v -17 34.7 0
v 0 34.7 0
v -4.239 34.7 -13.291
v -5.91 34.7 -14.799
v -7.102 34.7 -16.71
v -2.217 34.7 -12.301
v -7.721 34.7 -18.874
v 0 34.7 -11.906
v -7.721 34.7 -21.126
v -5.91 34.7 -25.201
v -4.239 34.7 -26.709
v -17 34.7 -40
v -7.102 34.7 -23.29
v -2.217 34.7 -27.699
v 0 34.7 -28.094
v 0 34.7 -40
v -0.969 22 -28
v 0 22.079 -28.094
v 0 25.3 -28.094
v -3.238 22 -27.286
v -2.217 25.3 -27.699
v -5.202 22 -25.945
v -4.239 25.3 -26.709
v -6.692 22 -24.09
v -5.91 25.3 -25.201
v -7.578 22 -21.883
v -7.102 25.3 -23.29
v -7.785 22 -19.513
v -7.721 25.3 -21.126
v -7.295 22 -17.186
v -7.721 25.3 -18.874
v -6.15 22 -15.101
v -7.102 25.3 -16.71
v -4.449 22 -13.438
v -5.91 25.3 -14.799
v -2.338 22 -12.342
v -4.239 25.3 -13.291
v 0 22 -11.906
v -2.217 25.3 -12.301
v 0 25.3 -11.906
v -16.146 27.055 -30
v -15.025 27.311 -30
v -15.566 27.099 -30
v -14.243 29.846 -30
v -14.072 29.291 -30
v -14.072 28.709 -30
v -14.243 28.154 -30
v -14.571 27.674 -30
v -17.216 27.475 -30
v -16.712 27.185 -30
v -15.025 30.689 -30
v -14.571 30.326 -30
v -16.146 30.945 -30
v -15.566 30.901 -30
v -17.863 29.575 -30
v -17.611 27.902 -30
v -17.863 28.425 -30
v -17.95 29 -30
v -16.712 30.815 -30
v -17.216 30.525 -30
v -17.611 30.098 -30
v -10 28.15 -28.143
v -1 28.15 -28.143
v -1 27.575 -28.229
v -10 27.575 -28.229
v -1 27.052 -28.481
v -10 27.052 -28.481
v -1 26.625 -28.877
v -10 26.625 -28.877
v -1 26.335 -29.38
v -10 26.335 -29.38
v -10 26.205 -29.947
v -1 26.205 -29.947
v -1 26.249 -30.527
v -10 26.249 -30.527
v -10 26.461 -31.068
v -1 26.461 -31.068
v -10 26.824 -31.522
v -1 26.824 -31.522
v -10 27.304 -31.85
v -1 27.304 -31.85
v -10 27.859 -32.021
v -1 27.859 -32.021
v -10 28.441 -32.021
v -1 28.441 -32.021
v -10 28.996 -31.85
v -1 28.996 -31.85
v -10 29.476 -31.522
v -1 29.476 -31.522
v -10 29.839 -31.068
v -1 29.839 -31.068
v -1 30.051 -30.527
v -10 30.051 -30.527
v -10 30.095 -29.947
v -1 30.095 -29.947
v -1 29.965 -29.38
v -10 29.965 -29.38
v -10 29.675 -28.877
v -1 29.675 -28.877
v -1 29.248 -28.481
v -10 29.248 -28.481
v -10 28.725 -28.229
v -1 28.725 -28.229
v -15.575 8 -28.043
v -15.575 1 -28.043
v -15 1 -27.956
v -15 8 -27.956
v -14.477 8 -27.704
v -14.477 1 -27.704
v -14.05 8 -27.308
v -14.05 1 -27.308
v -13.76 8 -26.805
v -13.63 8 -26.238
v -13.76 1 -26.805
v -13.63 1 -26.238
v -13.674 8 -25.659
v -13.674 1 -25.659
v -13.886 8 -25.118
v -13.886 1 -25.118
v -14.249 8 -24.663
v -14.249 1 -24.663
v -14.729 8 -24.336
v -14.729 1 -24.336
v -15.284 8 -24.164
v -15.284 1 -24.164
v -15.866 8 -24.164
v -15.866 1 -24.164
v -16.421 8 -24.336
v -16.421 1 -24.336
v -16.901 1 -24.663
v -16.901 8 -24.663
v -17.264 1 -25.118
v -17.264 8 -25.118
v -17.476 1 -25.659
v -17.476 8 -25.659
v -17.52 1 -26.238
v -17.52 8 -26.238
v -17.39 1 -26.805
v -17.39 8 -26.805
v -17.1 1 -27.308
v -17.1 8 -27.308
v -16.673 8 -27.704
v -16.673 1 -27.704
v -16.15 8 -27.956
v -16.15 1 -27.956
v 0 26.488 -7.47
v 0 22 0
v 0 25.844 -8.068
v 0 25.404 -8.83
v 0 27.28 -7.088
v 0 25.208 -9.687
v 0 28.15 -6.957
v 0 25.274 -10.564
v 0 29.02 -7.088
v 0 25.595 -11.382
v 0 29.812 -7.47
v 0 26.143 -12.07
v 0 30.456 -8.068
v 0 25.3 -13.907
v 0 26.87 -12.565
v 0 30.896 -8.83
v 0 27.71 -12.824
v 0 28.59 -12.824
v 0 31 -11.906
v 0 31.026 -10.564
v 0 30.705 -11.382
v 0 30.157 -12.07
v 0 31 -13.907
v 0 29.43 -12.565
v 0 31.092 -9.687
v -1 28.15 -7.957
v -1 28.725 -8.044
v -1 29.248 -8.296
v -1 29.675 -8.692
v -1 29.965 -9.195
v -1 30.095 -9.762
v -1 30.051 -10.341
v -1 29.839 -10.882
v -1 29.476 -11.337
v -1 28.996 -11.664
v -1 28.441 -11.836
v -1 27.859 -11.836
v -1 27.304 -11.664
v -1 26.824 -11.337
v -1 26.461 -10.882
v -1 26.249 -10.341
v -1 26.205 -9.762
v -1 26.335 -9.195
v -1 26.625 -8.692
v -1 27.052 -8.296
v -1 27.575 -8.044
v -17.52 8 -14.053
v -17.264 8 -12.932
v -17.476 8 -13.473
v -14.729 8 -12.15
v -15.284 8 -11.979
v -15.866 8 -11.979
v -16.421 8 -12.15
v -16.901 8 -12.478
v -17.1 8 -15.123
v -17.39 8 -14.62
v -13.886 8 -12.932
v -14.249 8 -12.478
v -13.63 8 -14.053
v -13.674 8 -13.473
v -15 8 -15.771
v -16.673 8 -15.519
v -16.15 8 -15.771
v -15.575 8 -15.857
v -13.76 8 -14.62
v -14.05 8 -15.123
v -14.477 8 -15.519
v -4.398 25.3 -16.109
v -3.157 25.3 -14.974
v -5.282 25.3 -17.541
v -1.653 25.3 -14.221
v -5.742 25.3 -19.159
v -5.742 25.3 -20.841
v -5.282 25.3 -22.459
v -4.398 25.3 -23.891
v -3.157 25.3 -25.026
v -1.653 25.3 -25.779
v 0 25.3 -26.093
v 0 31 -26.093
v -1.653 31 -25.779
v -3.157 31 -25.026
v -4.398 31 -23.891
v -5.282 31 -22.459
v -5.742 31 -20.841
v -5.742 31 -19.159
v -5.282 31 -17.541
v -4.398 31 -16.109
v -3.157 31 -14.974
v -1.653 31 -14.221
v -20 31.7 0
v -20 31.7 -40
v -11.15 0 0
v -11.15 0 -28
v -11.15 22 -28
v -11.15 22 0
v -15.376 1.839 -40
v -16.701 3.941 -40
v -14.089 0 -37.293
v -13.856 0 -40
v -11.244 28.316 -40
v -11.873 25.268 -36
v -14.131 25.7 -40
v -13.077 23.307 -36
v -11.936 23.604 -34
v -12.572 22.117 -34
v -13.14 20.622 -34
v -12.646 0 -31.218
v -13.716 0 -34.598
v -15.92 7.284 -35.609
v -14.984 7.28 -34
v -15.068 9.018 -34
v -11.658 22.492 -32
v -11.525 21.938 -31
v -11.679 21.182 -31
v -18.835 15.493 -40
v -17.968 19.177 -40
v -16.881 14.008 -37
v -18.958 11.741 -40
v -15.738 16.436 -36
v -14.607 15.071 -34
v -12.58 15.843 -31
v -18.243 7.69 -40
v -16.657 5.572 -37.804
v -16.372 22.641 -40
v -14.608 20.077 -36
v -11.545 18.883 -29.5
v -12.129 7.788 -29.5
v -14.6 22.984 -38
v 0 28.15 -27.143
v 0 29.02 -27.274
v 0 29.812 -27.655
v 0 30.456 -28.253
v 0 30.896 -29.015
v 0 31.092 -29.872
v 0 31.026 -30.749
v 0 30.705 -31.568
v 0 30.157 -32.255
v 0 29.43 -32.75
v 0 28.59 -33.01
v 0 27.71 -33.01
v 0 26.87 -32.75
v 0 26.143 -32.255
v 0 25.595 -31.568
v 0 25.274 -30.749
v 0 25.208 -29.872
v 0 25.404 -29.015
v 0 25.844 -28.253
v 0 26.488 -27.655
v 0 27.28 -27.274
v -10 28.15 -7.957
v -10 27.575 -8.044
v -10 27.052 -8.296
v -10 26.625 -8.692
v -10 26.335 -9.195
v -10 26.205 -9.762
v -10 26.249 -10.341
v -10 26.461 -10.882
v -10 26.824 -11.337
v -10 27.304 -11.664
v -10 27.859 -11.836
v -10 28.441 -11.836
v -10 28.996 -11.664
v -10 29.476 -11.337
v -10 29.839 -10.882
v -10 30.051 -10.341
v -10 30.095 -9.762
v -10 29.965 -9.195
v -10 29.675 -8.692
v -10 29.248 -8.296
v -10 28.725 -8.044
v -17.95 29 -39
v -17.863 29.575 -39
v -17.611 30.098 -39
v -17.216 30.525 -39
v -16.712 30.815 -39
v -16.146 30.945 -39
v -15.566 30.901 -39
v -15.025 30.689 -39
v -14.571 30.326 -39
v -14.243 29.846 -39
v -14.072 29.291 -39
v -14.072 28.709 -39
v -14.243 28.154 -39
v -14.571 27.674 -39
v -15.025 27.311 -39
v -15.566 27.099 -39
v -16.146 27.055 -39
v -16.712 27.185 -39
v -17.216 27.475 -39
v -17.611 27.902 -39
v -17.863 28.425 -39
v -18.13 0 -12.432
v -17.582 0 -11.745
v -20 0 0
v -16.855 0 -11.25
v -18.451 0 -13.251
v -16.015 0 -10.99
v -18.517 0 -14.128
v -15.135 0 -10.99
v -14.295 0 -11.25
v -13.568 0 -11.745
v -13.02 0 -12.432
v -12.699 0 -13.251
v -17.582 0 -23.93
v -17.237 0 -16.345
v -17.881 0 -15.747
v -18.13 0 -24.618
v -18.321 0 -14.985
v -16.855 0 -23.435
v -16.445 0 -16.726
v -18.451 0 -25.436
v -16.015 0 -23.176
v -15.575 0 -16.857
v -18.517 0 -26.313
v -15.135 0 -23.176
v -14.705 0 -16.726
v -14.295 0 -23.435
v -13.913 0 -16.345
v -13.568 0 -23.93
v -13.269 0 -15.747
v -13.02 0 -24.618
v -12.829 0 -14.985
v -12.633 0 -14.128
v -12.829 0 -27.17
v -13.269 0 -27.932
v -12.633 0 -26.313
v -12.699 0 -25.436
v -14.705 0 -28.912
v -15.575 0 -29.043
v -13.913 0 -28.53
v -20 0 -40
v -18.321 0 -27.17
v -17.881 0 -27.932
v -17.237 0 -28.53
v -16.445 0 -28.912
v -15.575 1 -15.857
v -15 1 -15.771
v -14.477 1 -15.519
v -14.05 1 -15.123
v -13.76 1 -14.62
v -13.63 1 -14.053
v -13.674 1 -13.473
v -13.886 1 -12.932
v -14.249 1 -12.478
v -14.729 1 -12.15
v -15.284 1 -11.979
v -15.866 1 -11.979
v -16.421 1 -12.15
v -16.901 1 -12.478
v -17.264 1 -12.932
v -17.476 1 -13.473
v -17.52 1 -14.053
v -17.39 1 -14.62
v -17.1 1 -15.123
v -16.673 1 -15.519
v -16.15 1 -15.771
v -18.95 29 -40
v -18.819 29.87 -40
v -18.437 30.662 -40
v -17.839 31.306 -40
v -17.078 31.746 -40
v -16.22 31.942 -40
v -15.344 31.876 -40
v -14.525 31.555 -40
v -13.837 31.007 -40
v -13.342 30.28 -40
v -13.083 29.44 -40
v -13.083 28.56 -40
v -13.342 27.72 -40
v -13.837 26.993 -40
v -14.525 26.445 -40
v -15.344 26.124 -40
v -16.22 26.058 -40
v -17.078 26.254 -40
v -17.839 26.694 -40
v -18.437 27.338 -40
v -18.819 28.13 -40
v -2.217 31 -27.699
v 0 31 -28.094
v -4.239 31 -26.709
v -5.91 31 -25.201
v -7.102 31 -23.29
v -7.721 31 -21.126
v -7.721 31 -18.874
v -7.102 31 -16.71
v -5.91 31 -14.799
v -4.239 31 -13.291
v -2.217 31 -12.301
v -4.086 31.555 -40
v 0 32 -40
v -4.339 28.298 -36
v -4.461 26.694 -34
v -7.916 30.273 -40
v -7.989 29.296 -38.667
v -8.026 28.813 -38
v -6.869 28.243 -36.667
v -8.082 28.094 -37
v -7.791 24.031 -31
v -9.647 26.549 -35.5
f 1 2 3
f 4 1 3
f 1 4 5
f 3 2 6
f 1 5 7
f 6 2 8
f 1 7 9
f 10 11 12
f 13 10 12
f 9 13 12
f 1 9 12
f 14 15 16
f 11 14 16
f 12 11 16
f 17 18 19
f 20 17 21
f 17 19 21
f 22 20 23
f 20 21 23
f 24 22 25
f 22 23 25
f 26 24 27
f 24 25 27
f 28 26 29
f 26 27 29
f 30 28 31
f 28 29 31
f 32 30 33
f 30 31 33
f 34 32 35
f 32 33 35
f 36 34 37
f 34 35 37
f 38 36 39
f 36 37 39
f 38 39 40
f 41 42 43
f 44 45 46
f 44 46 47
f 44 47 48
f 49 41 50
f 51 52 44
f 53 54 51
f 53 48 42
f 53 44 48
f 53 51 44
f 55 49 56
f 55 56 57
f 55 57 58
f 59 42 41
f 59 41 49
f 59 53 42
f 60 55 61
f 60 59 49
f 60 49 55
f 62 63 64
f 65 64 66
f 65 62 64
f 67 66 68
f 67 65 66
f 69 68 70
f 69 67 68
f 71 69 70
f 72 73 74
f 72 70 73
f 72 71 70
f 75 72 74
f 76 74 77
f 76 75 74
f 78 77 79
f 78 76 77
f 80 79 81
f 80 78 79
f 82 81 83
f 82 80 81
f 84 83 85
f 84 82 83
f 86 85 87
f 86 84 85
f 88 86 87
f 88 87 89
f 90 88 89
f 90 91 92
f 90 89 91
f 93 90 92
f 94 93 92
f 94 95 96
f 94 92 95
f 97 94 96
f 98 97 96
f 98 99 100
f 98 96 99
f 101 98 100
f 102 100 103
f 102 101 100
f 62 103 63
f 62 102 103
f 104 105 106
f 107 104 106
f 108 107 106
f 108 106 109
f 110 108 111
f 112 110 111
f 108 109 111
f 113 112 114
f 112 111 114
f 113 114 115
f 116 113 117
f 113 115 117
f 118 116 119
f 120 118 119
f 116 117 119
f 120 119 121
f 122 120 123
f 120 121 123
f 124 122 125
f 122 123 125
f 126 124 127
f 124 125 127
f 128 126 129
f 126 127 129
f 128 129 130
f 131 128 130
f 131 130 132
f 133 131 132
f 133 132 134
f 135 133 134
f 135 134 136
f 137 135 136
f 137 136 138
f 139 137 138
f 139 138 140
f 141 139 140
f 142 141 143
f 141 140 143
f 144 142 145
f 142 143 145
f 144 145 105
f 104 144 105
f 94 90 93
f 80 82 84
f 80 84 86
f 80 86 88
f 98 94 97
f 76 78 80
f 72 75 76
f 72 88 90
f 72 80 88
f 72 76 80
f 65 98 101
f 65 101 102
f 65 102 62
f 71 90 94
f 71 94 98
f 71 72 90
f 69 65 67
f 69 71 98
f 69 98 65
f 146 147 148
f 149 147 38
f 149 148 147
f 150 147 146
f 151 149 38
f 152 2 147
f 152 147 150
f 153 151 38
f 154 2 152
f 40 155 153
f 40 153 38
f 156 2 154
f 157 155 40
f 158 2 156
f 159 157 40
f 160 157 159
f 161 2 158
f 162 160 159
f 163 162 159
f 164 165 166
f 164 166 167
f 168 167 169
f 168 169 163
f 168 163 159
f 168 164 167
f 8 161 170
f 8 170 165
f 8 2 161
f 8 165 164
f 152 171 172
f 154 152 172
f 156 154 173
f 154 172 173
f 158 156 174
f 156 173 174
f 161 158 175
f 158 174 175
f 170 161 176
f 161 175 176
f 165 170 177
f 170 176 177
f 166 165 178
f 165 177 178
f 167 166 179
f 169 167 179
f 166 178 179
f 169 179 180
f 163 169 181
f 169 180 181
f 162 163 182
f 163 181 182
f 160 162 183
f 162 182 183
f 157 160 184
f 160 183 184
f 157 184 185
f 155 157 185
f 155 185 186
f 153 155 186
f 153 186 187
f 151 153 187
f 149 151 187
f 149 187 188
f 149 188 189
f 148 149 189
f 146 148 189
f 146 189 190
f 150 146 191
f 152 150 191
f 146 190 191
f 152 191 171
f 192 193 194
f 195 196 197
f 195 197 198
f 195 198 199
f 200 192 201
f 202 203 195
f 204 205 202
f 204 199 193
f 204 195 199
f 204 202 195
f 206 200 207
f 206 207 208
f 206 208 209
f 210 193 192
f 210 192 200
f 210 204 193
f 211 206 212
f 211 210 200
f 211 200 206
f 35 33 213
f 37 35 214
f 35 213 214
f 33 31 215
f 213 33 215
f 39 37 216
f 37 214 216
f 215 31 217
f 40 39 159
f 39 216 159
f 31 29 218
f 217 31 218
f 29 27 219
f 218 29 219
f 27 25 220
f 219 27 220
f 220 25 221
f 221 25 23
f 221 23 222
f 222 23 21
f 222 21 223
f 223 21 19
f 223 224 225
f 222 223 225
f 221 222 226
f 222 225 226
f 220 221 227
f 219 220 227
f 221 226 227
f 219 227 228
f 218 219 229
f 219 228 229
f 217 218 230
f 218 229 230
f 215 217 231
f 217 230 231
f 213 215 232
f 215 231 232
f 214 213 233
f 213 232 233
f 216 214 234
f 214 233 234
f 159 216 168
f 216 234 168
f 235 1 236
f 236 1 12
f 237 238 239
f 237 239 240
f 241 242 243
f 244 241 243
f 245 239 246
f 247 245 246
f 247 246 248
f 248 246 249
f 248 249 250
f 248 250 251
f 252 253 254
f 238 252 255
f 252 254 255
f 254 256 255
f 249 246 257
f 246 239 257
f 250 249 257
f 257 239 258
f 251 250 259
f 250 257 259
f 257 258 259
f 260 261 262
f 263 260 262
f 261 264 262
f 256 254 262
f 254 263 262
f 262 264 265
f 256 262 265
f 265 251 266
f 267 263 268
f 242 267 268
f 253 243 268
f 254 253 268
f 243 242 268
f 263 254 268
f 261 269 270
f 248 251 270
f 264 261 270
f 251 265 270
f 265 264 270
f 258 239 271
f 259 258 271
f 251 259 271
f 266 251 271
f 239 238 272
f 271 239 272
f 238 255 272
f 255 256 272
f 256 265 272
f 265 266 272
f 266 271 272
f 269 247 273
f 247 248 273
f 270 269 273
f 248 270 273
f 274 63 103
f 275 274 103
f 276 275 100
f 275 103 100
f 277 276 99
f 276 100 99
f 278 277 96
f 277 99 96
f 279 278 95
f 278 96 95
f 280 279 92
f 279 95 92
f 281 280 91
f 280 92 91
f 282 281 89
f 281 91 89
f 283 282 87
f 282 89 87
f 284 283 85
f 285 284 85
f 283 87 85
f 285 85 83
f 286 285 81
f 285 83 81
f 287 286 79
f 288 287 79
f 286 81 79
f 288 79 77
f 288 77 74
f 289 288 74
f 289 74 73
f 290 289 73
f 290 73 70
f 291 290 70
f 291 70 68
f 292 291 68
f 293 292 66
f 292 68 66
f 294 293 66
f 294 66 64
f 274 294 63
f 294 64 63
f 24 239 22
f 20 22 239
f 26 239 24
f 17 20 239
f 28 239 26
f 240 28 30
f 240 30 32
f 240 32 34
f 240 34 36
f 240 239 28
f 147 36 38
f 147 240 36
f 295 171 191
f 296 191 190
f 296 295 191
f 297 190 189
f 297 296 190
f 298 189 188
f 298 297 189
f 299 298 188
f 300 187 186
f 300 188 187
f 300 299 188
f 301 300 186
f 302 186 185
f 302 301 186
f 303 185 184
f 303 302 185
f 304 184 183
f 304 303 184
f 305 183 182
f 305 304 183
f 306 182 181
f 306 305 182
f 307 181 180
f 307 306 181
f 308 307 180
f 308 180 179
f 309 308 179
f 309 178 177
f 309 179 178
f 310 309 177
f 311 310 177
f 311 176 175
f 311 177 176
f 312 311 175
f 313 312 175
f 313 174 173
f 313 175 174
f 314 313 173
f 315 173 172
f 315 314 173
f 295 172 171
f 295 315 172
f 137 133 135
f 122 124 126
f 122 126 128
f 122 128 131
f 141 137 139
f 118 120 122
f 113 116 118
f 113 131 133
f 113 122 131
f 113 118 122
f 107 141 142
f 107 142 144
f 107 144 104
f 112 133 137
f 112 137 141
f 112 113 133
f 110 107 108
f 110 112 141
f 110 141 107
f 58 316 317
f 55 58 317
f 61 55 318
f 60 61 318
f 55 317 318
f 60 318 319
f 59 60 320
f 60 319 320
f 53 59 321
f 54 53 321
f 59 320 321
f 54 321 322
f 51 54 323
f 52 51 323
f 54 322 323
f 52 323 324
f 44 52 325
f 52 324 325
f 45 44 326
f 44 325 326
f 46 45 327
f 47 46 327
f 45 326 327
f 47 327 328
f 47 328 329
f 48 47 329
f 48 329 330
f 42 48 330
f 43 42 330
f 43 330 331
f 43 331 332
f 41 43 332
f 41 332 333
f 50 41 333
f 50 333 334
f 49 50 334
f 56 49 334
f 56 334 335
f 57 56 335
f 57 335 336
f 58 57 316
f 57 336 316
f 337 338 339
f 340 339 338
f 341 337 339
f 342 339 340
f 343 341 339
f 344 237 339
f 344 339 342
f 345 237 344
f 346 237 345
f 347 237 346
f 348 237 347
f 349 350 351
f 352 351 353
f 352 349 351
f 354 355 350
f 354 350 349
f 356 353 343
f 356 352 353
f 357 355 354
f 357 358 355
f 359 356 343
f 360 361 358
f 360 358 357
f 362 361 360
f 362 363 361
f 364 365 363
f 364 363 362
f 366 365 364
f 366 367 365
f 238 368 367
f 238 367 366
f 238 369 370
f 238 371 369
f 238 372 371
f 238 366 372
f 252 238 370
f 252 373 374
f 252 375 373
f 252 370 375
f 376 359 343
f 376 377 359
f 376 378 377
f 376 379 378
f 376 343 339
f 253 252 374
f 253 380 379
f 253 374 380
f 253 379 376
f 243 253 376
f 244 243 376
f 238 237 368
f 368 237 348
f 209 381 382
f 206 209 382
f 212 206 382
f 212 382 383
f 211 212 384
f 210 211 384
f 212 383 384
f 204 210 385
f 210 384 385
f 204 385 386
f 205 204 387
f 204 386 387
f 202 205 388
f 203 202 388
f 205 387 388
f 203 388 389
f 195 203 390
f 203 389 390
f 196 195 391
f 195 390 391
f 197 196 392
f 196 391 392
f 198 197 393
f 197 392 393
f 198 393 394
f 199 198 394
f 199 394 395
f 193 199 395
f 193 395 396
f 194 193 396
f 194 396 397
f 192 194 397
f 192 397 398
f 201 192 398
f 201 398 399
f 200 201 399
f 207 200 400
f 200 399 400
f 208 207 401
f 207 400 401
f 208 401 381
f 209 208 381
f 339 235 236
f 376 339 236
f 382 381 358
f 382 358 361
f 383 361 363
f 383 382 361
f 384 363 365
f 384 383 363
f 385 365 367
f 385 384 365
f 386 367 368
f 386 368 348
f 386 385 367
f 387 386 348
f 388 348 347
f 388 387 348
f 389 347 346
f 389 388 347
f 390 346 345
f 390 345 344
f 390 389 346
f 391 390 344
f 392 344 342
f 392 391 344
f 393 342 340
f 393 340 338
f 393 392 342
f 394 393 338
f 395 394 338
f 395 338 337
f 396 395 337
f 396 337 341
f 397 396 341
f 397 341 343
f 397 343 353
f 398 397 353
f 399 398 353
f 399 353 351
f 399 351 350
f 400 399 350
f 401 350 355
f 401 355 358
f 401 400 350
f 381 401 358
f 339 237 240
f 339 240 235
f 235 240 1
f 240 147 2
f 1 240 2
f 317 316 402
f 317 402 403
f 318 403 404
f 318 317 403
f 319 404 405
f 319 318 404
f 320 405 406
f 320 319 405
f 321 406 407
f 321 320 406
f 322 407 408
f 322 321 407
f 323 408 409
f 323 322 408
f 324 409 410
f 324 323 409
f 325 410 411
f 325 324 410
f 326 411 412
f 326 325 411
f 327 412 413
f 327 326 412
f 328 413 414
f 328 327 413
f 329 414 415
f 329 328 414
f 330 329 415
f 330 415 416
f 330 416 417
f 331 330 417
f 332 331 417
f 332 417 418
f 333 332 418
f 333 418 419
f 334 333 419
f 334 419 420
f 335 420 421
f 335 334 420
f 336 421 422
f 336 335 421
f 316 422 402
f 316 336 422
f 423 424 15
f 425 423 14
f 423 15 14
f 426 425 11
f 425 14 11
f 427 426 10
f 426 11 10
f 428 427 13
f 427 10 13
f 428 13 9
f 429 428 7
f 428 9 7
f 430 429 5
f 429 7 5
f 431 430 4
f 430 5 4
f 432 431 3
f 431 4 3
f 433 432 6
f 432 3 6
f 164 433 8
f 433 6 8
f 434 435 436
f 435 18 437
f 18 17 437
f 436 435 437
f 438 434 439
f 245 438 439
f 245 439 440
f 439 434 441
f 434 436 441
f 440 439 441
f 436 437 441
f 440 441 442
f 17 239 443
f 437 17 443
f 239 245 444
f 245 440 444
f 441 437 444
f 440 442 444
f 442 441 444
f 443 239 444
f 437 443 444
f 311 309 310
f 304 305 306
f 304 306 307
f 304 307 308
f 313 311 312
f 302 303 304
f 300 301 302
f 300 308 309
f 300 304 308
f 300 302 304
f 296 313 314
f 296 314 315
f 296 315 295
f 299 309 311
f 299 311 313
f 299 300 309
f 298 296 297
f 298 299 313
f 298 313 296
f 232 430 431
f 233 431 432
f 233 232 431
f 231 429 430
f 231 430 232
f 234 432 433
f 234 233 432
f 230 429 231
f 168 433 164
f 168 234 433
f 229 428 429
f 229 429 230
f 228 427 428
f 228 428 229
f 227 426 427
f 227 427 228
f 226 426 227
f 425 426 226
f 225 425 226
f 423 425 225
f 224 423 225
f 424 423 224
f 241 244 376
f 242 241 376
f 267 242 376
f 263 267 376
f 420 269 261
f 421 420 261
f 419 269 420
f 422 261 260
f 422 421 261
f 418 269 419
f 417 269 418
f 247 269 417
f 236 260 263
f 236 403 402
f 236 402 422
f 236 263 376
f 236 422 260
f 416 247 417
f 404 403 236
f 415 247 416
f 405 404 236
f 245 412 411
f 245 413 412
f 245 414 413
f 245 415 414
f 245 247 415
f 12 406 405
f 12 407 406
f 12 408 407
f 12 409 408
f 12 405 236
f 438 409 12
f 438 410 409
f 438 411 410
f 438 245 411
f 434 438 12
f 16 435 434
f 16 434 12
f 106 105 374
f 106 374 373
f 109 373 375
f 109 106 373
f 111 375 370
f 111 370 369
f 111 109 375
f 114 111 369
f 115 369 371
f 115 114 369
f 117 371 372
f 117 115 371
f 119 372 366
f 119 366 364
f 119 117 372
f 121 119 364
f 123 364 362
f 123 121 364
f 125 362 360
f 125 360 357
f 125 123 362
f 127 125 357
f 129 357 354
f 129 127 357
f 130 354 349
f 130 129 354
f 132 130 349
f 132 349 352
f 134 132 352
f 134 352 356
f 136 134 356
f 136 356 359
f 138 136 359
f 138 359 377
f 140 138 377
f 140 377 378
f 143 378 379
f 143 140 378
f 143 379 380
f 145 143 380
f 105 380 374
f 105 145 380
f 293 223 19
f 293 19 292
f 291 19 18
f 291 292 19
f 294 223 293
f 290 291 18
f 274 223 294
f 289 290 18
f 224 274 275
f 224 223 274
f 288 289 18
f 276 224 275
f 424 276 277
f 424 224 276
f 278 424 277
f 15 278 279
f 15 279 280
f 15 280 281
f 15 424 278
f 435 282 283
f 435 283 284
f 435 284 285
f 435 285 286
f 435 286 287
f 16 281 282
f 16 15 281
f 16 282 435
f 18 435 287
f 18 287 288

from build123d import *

# Parameters (mm, degrees)
SKETCH1_W               = 40
SKETCH1_H               = 34.7
BOSS_EXTRUDE1_DEPTH     = 20
SKETCH2_R               = 8.1
CUT_EXTRUDE1_DEPTH      = 12.7
SKETCH5_W               = 11.15
SKETCH5_H               = 40
CUT_EXTRUDE5_DEPTH      = 22
SKETCH9_R               = 8.1
SKETCH9_R_2             = 6.1
BOSS_EXTRUDE2_DEPTH     = 5.7
CUT_EXTRUDE6_DEPTH      = 57.604681952
CUT_EXTRUDE6_DEPTH_BACK = 57.604681952
SKETCH10_W              = 12
SKETCH10_H              = 40
SKETCH11_R              = 1.95
CUT_EXTRUDE7_DEPTH      = 8
CHAMFER1_SIZE           = 1
SKETCH12_R              = 1.95
CUT_EXTRUDE8_DEPTH      = 54.889609545
CHAMFER2_SIZE           = 1
SKETCH15_R              = 1.95
CUT_EXTRUDE11_DEPTH     = 10
CHAMFER3_SIZE           = 1
CHAMFER7_SIZE           = 3


with BuildPart() as part:
    # Sketch1 → Boss-Extrude1 (new body)
    with BuildSketch(Plane(origin=(0, 0, 0), x_dir=(0, 0, -1), z_dir=(1, 0, 0))):
        with Locations((20, 17.35)):
            Rectangle(SKETCH1_W, SKETCH1_H)
    extrude(amount=-BOSS_EXTRUDE1_DEPTH)

    # Sketch2 → Cut-Extrude1 (cut)
    with BuildSketch(Plane(origin=(0, 34.7, 0), x_dir=(1, 0, 0), z_dir=(0, 1, 0))):
        with Locations((0.3, 20)):
            Circle(SKETCH2_R)
    extrude(amount=-CUT_EXTRUDE1_DEPTH, mode=Mode.SUBTRACT)

    # Sketch5 → Cut-Extrude5 (cut)
    with BuildSketch(Plane.XZ):
        with Locations((-5.575, -20)):
            Rectangle(SKETCH5_W, SKETCH5_H)
    extrude(amount=-CUT_EXTRUDE5_DEPTH, mode=Mode.SUBTRACT)

    # Cut-Loft1: read off the stored shape, not the designer's step
    # Cut-Loft1: loft between two sections, ruled curve by curve
    cut_loft1_from = [
        Edge.make_bspline([(11.243514961, 28.316114759, -40), (10.488221253, 28.870573657, -40), (9.673151561, 29.382537078, -40), (7.939112522, 30.28953078, -40), (7.020163395, 30.684407436, -40), (5.104947281, 31.329224581, -40), (4.108776624, 31.579024462, -40), (2.074994957, 31.914454558, -40), (1.037543565, 32, -40), (-1.037543565, 32, -40), (-2.074994957, 31.914454558, -40), (-4.108776624, 31.579024462, -40), (-5.104947281, 31.329224581, -40), (-7.020163395, 30.684407436, -40), (-7.939112522, 30.28953078, -40), (-9.673151561, 29.382537078, -40), (-10.488221253, 28.870573657, -40), (-11.243514961, 28.316114759, -40)], [0, 0, 0, 0, 0.125, 0.125, 0.25, 0.25, 0.375, 0.375, 0.5, 0.5, 0.625, 0.625, 0.75, 0.75, 0.875, 0.875, 1, 1, 1, 1], 3),
        Edge.make_bspline([(-11.243514961, 28.316114759, -40), (-12.272389396, 27.560821051, -40), (-13.278735727, 26.661602289, -40), (-15.139556406, 24.56538073, -40), (-15.993134823, 23.367779698, -40), (-17.42758787, 20.71689046, -40), (-18.007136515, 19.263731202, -40), (-18.79386095, 16.206568982, -40), (-19, 14.603683637, -40), (-19, 11.396316363, -40), (-18.79386095, 9.793431018, -40), (-18.007136515, 6.736268798, -40), (-17.42758787, 5.28310954, -40), (-15.993134823, 2.632220302, -40), (-15.139556406, 1.43461927, -40), (-13.278735727, -0.661602289, -40), (-12.272389396, -1.560821051, -40), (-11.243514961, -2.316114759, -40)], [0, 0, 0, 0, 0.125, 0.125, 0.25, 0.25, 0.375, 0.375, 0.5, 0.5, 0.625, 0.625, 0.75, 0.75, 0.875, 0.875, 1, 1, 1, 1], 3),
        Edge.make_line((-11.243514961, -2.316114759, -40), (11.243514961, 28.316114759, -40)),
    ]
    cut_loft1_to = [
        Edge.make_bspline([(11.85, 22, -28), (10.891666667, 22, -28), (9.933333333, 22, -28), (8.016666667, 22, -28), (7.058333333, 22, -28), (5.141666667, 22, -28), (4.183333333, 22, -28), (2.266666667, 22, -28), (1.308333333, 22, -28), (-0.608333333, 22, -28), (-1.566666667, 22, -28), (-3.483333333, 22, -28), (-4.441666667, 22, -28), (-6.358333333, 22, -28), (-7.316666667, 22, -28), (-9.233333333, 22, -28), (-10.191666667, 22, -28), (-11.15, 22, -28)], [0, 0, 0, 0, 0.125, 0.125, 0.25, 0.25, 0.375, 0.375, 0.5, 0.5, 0.625, 0.625, 0.75, 0.75, 0.875, 0.875, 1, 1, 1, 1], 3),
        Edge.make_bspline([(-11.15, 22, -28), (-11.15, 20.694541399, -28), (-11.15, 19.389082798, -28), (-11.15, 16.778165596, -28), (-11.15, 15.472706995, -28), (-11.15, 12.861789793, -28), (-11.15, 11.556331192, -28), (-11.15, 8.94541399, -28), (-11.15, 7.639955389, -28), (-11.15, 5.029038187, -28), (-11.15, 3.723579586, -28), (-11.15, 1.112662384, -28), (-11.15, -0.192796217, -28), (-11.15, -2.803713419, -28), (-11.15, -4.10917202, -28), (-11.15, -6.720089222, -28), (-11.15, -8.025547823, -28), (-11.15, -9.331006424, -28)], [0, 0, 0, 0, 0.125, 0.125, 0.25, 0.25, 0.375, 0.375, 0.5, 0.5, 0.625, 0.625, 0.75, 0.75, 0.875, 0.875, 1, 1, 1, 1], 3),
        Edge.make_line((-11.15, -9.331006424, -28), (11.85, 22, -28)),
    ]
    cut_loft1 = Solid(Shell([*[Face.make_surface_from_curves(cut_loft1_from[k], cut_loft1_to[k]) for k in range(3)], Face(Wire(cut_loft1_from)), Face(Wire(cut_loft1_to))]))
    add(cut_loft1, mode=Mode.SUBTRACT)

    # Sketch9 → Boss-Extrude2 (add)
    with BuildSketch(Plane(origin=(0, 31, 0), x_dir=(1, 0, 0), z_dir=(0, 1, 0))):
        with Locations((0.3, 20)):
            Circle(SKETCH9_R)
        with Locations(Location((0.3, 20, 0), (0, 0, 270))):
            Circle(SKETCH9_R_2, mode=Mode.SUBTRACT)
    extrude(amount=-BOSS_EXTRUDE2_DEPTH)

    # Sketch10 → Cut-Extrude6 (cut, two sides: drawn at the far end of the back side and taken through both)
    with BuildSketch(Plane(origin=(0, 0, 0), x_dir=(1, 0, 0), z_dir=(0, 1, 0)).offset(-CUT_EXTRUDE6_DEPTH_BACK)):
        with Locations((6, 20)):
            Rectangle(SKETCH10_W, SKETCH10_H)
    extrude(amount=CUT_EXTRUDE6_DEPTH + CUT_EXTRUDE6_DEPTH_BACK, mode=Mode.SUBTRACT)

    # Sketch11 → Cut-Extrude7 (cut)
    with BuildSketch(Plane.XZ):
        with Locations(Location((-15.575, -13.907381515, 0), (0, 0, 270))):
            Circle(SKETCH11_R)
        with Locations(Location((-15.575, -26.092618485, 0), (0, 0, 270))):
            Circle(SKETCH11_R)
    extrude(amount=-CUT_EXTRUDE7_DEPTH, mode=Mode.SUBTRACT)

    # Chamfer1
    chamfer1_edges = [part.edges().sort_by_distance(p)[0] for p in [
        (-15.575, 0, -11.957381515),
        (-15.575, 0, -24.142618485),
    ]]
    chamfer(chamfer1_edges, length=CHAMFER1_SIZE)

    # Sketch12 → Cut-Extrude8 (cut, through all)
    with BuildSketch(Plane(origin=(-10, 0, 0), x_dir=(0, 0, -1), z_dir=(1, 0, 0))):
        with Locations(Location((9.907381515, 28.15, 0), (0, 0, 180))):
            Circle(SKETCH12_R)
        with Locations(Location((30.092618485, 28.15, 0), (0, 0, 180))):
            Circle(SKETCH12_R)
    extrude(amount=CUT_EXTRUDE8_DEPTH, mode=Mode.SUBTRACT)

    # Chamfer2
    chamfer2_edges = [part.edges().sort_by_distance(p)[0] for p in [
        (0, 28.15, -11.857381515),
        (0, 28.15, -32.042618485),
    ]]
    chamfer(chamfer2_edges, length=CHAMFER2_SIZE)

    # Sketch15 → Cut-Extrude11 (cut)
    with BuildSketch(Plane(origin=(0, 0, -40), x_dir=(-1, 0, 0), z_dir=(0, 0, -1))):
        with Locations((16, 29)):
            Circle(SKETCH15_R)
    extrude(amount=-CUT_EXTRUDE11_DEPTH, mode=Mode.SUBTRACT)

    # Chamfer3
    chamfer3_edges = [part.edges().sort_by_distance(p)[0] for p in [
        (-14.05, 29, -40),
    ]]
    chamfer(chamfer3_edges, length=CHAMFER3_SIZE)

    # Chamfer7
    chamfer7_edges = [part.edges().sort_by_distance(p)[0] for p in [
        (-20, 34.7, -20),
    ]]
    chamfer(chamfer7_edges, length=CHAMFER7_SIZE)


solid = part.part
